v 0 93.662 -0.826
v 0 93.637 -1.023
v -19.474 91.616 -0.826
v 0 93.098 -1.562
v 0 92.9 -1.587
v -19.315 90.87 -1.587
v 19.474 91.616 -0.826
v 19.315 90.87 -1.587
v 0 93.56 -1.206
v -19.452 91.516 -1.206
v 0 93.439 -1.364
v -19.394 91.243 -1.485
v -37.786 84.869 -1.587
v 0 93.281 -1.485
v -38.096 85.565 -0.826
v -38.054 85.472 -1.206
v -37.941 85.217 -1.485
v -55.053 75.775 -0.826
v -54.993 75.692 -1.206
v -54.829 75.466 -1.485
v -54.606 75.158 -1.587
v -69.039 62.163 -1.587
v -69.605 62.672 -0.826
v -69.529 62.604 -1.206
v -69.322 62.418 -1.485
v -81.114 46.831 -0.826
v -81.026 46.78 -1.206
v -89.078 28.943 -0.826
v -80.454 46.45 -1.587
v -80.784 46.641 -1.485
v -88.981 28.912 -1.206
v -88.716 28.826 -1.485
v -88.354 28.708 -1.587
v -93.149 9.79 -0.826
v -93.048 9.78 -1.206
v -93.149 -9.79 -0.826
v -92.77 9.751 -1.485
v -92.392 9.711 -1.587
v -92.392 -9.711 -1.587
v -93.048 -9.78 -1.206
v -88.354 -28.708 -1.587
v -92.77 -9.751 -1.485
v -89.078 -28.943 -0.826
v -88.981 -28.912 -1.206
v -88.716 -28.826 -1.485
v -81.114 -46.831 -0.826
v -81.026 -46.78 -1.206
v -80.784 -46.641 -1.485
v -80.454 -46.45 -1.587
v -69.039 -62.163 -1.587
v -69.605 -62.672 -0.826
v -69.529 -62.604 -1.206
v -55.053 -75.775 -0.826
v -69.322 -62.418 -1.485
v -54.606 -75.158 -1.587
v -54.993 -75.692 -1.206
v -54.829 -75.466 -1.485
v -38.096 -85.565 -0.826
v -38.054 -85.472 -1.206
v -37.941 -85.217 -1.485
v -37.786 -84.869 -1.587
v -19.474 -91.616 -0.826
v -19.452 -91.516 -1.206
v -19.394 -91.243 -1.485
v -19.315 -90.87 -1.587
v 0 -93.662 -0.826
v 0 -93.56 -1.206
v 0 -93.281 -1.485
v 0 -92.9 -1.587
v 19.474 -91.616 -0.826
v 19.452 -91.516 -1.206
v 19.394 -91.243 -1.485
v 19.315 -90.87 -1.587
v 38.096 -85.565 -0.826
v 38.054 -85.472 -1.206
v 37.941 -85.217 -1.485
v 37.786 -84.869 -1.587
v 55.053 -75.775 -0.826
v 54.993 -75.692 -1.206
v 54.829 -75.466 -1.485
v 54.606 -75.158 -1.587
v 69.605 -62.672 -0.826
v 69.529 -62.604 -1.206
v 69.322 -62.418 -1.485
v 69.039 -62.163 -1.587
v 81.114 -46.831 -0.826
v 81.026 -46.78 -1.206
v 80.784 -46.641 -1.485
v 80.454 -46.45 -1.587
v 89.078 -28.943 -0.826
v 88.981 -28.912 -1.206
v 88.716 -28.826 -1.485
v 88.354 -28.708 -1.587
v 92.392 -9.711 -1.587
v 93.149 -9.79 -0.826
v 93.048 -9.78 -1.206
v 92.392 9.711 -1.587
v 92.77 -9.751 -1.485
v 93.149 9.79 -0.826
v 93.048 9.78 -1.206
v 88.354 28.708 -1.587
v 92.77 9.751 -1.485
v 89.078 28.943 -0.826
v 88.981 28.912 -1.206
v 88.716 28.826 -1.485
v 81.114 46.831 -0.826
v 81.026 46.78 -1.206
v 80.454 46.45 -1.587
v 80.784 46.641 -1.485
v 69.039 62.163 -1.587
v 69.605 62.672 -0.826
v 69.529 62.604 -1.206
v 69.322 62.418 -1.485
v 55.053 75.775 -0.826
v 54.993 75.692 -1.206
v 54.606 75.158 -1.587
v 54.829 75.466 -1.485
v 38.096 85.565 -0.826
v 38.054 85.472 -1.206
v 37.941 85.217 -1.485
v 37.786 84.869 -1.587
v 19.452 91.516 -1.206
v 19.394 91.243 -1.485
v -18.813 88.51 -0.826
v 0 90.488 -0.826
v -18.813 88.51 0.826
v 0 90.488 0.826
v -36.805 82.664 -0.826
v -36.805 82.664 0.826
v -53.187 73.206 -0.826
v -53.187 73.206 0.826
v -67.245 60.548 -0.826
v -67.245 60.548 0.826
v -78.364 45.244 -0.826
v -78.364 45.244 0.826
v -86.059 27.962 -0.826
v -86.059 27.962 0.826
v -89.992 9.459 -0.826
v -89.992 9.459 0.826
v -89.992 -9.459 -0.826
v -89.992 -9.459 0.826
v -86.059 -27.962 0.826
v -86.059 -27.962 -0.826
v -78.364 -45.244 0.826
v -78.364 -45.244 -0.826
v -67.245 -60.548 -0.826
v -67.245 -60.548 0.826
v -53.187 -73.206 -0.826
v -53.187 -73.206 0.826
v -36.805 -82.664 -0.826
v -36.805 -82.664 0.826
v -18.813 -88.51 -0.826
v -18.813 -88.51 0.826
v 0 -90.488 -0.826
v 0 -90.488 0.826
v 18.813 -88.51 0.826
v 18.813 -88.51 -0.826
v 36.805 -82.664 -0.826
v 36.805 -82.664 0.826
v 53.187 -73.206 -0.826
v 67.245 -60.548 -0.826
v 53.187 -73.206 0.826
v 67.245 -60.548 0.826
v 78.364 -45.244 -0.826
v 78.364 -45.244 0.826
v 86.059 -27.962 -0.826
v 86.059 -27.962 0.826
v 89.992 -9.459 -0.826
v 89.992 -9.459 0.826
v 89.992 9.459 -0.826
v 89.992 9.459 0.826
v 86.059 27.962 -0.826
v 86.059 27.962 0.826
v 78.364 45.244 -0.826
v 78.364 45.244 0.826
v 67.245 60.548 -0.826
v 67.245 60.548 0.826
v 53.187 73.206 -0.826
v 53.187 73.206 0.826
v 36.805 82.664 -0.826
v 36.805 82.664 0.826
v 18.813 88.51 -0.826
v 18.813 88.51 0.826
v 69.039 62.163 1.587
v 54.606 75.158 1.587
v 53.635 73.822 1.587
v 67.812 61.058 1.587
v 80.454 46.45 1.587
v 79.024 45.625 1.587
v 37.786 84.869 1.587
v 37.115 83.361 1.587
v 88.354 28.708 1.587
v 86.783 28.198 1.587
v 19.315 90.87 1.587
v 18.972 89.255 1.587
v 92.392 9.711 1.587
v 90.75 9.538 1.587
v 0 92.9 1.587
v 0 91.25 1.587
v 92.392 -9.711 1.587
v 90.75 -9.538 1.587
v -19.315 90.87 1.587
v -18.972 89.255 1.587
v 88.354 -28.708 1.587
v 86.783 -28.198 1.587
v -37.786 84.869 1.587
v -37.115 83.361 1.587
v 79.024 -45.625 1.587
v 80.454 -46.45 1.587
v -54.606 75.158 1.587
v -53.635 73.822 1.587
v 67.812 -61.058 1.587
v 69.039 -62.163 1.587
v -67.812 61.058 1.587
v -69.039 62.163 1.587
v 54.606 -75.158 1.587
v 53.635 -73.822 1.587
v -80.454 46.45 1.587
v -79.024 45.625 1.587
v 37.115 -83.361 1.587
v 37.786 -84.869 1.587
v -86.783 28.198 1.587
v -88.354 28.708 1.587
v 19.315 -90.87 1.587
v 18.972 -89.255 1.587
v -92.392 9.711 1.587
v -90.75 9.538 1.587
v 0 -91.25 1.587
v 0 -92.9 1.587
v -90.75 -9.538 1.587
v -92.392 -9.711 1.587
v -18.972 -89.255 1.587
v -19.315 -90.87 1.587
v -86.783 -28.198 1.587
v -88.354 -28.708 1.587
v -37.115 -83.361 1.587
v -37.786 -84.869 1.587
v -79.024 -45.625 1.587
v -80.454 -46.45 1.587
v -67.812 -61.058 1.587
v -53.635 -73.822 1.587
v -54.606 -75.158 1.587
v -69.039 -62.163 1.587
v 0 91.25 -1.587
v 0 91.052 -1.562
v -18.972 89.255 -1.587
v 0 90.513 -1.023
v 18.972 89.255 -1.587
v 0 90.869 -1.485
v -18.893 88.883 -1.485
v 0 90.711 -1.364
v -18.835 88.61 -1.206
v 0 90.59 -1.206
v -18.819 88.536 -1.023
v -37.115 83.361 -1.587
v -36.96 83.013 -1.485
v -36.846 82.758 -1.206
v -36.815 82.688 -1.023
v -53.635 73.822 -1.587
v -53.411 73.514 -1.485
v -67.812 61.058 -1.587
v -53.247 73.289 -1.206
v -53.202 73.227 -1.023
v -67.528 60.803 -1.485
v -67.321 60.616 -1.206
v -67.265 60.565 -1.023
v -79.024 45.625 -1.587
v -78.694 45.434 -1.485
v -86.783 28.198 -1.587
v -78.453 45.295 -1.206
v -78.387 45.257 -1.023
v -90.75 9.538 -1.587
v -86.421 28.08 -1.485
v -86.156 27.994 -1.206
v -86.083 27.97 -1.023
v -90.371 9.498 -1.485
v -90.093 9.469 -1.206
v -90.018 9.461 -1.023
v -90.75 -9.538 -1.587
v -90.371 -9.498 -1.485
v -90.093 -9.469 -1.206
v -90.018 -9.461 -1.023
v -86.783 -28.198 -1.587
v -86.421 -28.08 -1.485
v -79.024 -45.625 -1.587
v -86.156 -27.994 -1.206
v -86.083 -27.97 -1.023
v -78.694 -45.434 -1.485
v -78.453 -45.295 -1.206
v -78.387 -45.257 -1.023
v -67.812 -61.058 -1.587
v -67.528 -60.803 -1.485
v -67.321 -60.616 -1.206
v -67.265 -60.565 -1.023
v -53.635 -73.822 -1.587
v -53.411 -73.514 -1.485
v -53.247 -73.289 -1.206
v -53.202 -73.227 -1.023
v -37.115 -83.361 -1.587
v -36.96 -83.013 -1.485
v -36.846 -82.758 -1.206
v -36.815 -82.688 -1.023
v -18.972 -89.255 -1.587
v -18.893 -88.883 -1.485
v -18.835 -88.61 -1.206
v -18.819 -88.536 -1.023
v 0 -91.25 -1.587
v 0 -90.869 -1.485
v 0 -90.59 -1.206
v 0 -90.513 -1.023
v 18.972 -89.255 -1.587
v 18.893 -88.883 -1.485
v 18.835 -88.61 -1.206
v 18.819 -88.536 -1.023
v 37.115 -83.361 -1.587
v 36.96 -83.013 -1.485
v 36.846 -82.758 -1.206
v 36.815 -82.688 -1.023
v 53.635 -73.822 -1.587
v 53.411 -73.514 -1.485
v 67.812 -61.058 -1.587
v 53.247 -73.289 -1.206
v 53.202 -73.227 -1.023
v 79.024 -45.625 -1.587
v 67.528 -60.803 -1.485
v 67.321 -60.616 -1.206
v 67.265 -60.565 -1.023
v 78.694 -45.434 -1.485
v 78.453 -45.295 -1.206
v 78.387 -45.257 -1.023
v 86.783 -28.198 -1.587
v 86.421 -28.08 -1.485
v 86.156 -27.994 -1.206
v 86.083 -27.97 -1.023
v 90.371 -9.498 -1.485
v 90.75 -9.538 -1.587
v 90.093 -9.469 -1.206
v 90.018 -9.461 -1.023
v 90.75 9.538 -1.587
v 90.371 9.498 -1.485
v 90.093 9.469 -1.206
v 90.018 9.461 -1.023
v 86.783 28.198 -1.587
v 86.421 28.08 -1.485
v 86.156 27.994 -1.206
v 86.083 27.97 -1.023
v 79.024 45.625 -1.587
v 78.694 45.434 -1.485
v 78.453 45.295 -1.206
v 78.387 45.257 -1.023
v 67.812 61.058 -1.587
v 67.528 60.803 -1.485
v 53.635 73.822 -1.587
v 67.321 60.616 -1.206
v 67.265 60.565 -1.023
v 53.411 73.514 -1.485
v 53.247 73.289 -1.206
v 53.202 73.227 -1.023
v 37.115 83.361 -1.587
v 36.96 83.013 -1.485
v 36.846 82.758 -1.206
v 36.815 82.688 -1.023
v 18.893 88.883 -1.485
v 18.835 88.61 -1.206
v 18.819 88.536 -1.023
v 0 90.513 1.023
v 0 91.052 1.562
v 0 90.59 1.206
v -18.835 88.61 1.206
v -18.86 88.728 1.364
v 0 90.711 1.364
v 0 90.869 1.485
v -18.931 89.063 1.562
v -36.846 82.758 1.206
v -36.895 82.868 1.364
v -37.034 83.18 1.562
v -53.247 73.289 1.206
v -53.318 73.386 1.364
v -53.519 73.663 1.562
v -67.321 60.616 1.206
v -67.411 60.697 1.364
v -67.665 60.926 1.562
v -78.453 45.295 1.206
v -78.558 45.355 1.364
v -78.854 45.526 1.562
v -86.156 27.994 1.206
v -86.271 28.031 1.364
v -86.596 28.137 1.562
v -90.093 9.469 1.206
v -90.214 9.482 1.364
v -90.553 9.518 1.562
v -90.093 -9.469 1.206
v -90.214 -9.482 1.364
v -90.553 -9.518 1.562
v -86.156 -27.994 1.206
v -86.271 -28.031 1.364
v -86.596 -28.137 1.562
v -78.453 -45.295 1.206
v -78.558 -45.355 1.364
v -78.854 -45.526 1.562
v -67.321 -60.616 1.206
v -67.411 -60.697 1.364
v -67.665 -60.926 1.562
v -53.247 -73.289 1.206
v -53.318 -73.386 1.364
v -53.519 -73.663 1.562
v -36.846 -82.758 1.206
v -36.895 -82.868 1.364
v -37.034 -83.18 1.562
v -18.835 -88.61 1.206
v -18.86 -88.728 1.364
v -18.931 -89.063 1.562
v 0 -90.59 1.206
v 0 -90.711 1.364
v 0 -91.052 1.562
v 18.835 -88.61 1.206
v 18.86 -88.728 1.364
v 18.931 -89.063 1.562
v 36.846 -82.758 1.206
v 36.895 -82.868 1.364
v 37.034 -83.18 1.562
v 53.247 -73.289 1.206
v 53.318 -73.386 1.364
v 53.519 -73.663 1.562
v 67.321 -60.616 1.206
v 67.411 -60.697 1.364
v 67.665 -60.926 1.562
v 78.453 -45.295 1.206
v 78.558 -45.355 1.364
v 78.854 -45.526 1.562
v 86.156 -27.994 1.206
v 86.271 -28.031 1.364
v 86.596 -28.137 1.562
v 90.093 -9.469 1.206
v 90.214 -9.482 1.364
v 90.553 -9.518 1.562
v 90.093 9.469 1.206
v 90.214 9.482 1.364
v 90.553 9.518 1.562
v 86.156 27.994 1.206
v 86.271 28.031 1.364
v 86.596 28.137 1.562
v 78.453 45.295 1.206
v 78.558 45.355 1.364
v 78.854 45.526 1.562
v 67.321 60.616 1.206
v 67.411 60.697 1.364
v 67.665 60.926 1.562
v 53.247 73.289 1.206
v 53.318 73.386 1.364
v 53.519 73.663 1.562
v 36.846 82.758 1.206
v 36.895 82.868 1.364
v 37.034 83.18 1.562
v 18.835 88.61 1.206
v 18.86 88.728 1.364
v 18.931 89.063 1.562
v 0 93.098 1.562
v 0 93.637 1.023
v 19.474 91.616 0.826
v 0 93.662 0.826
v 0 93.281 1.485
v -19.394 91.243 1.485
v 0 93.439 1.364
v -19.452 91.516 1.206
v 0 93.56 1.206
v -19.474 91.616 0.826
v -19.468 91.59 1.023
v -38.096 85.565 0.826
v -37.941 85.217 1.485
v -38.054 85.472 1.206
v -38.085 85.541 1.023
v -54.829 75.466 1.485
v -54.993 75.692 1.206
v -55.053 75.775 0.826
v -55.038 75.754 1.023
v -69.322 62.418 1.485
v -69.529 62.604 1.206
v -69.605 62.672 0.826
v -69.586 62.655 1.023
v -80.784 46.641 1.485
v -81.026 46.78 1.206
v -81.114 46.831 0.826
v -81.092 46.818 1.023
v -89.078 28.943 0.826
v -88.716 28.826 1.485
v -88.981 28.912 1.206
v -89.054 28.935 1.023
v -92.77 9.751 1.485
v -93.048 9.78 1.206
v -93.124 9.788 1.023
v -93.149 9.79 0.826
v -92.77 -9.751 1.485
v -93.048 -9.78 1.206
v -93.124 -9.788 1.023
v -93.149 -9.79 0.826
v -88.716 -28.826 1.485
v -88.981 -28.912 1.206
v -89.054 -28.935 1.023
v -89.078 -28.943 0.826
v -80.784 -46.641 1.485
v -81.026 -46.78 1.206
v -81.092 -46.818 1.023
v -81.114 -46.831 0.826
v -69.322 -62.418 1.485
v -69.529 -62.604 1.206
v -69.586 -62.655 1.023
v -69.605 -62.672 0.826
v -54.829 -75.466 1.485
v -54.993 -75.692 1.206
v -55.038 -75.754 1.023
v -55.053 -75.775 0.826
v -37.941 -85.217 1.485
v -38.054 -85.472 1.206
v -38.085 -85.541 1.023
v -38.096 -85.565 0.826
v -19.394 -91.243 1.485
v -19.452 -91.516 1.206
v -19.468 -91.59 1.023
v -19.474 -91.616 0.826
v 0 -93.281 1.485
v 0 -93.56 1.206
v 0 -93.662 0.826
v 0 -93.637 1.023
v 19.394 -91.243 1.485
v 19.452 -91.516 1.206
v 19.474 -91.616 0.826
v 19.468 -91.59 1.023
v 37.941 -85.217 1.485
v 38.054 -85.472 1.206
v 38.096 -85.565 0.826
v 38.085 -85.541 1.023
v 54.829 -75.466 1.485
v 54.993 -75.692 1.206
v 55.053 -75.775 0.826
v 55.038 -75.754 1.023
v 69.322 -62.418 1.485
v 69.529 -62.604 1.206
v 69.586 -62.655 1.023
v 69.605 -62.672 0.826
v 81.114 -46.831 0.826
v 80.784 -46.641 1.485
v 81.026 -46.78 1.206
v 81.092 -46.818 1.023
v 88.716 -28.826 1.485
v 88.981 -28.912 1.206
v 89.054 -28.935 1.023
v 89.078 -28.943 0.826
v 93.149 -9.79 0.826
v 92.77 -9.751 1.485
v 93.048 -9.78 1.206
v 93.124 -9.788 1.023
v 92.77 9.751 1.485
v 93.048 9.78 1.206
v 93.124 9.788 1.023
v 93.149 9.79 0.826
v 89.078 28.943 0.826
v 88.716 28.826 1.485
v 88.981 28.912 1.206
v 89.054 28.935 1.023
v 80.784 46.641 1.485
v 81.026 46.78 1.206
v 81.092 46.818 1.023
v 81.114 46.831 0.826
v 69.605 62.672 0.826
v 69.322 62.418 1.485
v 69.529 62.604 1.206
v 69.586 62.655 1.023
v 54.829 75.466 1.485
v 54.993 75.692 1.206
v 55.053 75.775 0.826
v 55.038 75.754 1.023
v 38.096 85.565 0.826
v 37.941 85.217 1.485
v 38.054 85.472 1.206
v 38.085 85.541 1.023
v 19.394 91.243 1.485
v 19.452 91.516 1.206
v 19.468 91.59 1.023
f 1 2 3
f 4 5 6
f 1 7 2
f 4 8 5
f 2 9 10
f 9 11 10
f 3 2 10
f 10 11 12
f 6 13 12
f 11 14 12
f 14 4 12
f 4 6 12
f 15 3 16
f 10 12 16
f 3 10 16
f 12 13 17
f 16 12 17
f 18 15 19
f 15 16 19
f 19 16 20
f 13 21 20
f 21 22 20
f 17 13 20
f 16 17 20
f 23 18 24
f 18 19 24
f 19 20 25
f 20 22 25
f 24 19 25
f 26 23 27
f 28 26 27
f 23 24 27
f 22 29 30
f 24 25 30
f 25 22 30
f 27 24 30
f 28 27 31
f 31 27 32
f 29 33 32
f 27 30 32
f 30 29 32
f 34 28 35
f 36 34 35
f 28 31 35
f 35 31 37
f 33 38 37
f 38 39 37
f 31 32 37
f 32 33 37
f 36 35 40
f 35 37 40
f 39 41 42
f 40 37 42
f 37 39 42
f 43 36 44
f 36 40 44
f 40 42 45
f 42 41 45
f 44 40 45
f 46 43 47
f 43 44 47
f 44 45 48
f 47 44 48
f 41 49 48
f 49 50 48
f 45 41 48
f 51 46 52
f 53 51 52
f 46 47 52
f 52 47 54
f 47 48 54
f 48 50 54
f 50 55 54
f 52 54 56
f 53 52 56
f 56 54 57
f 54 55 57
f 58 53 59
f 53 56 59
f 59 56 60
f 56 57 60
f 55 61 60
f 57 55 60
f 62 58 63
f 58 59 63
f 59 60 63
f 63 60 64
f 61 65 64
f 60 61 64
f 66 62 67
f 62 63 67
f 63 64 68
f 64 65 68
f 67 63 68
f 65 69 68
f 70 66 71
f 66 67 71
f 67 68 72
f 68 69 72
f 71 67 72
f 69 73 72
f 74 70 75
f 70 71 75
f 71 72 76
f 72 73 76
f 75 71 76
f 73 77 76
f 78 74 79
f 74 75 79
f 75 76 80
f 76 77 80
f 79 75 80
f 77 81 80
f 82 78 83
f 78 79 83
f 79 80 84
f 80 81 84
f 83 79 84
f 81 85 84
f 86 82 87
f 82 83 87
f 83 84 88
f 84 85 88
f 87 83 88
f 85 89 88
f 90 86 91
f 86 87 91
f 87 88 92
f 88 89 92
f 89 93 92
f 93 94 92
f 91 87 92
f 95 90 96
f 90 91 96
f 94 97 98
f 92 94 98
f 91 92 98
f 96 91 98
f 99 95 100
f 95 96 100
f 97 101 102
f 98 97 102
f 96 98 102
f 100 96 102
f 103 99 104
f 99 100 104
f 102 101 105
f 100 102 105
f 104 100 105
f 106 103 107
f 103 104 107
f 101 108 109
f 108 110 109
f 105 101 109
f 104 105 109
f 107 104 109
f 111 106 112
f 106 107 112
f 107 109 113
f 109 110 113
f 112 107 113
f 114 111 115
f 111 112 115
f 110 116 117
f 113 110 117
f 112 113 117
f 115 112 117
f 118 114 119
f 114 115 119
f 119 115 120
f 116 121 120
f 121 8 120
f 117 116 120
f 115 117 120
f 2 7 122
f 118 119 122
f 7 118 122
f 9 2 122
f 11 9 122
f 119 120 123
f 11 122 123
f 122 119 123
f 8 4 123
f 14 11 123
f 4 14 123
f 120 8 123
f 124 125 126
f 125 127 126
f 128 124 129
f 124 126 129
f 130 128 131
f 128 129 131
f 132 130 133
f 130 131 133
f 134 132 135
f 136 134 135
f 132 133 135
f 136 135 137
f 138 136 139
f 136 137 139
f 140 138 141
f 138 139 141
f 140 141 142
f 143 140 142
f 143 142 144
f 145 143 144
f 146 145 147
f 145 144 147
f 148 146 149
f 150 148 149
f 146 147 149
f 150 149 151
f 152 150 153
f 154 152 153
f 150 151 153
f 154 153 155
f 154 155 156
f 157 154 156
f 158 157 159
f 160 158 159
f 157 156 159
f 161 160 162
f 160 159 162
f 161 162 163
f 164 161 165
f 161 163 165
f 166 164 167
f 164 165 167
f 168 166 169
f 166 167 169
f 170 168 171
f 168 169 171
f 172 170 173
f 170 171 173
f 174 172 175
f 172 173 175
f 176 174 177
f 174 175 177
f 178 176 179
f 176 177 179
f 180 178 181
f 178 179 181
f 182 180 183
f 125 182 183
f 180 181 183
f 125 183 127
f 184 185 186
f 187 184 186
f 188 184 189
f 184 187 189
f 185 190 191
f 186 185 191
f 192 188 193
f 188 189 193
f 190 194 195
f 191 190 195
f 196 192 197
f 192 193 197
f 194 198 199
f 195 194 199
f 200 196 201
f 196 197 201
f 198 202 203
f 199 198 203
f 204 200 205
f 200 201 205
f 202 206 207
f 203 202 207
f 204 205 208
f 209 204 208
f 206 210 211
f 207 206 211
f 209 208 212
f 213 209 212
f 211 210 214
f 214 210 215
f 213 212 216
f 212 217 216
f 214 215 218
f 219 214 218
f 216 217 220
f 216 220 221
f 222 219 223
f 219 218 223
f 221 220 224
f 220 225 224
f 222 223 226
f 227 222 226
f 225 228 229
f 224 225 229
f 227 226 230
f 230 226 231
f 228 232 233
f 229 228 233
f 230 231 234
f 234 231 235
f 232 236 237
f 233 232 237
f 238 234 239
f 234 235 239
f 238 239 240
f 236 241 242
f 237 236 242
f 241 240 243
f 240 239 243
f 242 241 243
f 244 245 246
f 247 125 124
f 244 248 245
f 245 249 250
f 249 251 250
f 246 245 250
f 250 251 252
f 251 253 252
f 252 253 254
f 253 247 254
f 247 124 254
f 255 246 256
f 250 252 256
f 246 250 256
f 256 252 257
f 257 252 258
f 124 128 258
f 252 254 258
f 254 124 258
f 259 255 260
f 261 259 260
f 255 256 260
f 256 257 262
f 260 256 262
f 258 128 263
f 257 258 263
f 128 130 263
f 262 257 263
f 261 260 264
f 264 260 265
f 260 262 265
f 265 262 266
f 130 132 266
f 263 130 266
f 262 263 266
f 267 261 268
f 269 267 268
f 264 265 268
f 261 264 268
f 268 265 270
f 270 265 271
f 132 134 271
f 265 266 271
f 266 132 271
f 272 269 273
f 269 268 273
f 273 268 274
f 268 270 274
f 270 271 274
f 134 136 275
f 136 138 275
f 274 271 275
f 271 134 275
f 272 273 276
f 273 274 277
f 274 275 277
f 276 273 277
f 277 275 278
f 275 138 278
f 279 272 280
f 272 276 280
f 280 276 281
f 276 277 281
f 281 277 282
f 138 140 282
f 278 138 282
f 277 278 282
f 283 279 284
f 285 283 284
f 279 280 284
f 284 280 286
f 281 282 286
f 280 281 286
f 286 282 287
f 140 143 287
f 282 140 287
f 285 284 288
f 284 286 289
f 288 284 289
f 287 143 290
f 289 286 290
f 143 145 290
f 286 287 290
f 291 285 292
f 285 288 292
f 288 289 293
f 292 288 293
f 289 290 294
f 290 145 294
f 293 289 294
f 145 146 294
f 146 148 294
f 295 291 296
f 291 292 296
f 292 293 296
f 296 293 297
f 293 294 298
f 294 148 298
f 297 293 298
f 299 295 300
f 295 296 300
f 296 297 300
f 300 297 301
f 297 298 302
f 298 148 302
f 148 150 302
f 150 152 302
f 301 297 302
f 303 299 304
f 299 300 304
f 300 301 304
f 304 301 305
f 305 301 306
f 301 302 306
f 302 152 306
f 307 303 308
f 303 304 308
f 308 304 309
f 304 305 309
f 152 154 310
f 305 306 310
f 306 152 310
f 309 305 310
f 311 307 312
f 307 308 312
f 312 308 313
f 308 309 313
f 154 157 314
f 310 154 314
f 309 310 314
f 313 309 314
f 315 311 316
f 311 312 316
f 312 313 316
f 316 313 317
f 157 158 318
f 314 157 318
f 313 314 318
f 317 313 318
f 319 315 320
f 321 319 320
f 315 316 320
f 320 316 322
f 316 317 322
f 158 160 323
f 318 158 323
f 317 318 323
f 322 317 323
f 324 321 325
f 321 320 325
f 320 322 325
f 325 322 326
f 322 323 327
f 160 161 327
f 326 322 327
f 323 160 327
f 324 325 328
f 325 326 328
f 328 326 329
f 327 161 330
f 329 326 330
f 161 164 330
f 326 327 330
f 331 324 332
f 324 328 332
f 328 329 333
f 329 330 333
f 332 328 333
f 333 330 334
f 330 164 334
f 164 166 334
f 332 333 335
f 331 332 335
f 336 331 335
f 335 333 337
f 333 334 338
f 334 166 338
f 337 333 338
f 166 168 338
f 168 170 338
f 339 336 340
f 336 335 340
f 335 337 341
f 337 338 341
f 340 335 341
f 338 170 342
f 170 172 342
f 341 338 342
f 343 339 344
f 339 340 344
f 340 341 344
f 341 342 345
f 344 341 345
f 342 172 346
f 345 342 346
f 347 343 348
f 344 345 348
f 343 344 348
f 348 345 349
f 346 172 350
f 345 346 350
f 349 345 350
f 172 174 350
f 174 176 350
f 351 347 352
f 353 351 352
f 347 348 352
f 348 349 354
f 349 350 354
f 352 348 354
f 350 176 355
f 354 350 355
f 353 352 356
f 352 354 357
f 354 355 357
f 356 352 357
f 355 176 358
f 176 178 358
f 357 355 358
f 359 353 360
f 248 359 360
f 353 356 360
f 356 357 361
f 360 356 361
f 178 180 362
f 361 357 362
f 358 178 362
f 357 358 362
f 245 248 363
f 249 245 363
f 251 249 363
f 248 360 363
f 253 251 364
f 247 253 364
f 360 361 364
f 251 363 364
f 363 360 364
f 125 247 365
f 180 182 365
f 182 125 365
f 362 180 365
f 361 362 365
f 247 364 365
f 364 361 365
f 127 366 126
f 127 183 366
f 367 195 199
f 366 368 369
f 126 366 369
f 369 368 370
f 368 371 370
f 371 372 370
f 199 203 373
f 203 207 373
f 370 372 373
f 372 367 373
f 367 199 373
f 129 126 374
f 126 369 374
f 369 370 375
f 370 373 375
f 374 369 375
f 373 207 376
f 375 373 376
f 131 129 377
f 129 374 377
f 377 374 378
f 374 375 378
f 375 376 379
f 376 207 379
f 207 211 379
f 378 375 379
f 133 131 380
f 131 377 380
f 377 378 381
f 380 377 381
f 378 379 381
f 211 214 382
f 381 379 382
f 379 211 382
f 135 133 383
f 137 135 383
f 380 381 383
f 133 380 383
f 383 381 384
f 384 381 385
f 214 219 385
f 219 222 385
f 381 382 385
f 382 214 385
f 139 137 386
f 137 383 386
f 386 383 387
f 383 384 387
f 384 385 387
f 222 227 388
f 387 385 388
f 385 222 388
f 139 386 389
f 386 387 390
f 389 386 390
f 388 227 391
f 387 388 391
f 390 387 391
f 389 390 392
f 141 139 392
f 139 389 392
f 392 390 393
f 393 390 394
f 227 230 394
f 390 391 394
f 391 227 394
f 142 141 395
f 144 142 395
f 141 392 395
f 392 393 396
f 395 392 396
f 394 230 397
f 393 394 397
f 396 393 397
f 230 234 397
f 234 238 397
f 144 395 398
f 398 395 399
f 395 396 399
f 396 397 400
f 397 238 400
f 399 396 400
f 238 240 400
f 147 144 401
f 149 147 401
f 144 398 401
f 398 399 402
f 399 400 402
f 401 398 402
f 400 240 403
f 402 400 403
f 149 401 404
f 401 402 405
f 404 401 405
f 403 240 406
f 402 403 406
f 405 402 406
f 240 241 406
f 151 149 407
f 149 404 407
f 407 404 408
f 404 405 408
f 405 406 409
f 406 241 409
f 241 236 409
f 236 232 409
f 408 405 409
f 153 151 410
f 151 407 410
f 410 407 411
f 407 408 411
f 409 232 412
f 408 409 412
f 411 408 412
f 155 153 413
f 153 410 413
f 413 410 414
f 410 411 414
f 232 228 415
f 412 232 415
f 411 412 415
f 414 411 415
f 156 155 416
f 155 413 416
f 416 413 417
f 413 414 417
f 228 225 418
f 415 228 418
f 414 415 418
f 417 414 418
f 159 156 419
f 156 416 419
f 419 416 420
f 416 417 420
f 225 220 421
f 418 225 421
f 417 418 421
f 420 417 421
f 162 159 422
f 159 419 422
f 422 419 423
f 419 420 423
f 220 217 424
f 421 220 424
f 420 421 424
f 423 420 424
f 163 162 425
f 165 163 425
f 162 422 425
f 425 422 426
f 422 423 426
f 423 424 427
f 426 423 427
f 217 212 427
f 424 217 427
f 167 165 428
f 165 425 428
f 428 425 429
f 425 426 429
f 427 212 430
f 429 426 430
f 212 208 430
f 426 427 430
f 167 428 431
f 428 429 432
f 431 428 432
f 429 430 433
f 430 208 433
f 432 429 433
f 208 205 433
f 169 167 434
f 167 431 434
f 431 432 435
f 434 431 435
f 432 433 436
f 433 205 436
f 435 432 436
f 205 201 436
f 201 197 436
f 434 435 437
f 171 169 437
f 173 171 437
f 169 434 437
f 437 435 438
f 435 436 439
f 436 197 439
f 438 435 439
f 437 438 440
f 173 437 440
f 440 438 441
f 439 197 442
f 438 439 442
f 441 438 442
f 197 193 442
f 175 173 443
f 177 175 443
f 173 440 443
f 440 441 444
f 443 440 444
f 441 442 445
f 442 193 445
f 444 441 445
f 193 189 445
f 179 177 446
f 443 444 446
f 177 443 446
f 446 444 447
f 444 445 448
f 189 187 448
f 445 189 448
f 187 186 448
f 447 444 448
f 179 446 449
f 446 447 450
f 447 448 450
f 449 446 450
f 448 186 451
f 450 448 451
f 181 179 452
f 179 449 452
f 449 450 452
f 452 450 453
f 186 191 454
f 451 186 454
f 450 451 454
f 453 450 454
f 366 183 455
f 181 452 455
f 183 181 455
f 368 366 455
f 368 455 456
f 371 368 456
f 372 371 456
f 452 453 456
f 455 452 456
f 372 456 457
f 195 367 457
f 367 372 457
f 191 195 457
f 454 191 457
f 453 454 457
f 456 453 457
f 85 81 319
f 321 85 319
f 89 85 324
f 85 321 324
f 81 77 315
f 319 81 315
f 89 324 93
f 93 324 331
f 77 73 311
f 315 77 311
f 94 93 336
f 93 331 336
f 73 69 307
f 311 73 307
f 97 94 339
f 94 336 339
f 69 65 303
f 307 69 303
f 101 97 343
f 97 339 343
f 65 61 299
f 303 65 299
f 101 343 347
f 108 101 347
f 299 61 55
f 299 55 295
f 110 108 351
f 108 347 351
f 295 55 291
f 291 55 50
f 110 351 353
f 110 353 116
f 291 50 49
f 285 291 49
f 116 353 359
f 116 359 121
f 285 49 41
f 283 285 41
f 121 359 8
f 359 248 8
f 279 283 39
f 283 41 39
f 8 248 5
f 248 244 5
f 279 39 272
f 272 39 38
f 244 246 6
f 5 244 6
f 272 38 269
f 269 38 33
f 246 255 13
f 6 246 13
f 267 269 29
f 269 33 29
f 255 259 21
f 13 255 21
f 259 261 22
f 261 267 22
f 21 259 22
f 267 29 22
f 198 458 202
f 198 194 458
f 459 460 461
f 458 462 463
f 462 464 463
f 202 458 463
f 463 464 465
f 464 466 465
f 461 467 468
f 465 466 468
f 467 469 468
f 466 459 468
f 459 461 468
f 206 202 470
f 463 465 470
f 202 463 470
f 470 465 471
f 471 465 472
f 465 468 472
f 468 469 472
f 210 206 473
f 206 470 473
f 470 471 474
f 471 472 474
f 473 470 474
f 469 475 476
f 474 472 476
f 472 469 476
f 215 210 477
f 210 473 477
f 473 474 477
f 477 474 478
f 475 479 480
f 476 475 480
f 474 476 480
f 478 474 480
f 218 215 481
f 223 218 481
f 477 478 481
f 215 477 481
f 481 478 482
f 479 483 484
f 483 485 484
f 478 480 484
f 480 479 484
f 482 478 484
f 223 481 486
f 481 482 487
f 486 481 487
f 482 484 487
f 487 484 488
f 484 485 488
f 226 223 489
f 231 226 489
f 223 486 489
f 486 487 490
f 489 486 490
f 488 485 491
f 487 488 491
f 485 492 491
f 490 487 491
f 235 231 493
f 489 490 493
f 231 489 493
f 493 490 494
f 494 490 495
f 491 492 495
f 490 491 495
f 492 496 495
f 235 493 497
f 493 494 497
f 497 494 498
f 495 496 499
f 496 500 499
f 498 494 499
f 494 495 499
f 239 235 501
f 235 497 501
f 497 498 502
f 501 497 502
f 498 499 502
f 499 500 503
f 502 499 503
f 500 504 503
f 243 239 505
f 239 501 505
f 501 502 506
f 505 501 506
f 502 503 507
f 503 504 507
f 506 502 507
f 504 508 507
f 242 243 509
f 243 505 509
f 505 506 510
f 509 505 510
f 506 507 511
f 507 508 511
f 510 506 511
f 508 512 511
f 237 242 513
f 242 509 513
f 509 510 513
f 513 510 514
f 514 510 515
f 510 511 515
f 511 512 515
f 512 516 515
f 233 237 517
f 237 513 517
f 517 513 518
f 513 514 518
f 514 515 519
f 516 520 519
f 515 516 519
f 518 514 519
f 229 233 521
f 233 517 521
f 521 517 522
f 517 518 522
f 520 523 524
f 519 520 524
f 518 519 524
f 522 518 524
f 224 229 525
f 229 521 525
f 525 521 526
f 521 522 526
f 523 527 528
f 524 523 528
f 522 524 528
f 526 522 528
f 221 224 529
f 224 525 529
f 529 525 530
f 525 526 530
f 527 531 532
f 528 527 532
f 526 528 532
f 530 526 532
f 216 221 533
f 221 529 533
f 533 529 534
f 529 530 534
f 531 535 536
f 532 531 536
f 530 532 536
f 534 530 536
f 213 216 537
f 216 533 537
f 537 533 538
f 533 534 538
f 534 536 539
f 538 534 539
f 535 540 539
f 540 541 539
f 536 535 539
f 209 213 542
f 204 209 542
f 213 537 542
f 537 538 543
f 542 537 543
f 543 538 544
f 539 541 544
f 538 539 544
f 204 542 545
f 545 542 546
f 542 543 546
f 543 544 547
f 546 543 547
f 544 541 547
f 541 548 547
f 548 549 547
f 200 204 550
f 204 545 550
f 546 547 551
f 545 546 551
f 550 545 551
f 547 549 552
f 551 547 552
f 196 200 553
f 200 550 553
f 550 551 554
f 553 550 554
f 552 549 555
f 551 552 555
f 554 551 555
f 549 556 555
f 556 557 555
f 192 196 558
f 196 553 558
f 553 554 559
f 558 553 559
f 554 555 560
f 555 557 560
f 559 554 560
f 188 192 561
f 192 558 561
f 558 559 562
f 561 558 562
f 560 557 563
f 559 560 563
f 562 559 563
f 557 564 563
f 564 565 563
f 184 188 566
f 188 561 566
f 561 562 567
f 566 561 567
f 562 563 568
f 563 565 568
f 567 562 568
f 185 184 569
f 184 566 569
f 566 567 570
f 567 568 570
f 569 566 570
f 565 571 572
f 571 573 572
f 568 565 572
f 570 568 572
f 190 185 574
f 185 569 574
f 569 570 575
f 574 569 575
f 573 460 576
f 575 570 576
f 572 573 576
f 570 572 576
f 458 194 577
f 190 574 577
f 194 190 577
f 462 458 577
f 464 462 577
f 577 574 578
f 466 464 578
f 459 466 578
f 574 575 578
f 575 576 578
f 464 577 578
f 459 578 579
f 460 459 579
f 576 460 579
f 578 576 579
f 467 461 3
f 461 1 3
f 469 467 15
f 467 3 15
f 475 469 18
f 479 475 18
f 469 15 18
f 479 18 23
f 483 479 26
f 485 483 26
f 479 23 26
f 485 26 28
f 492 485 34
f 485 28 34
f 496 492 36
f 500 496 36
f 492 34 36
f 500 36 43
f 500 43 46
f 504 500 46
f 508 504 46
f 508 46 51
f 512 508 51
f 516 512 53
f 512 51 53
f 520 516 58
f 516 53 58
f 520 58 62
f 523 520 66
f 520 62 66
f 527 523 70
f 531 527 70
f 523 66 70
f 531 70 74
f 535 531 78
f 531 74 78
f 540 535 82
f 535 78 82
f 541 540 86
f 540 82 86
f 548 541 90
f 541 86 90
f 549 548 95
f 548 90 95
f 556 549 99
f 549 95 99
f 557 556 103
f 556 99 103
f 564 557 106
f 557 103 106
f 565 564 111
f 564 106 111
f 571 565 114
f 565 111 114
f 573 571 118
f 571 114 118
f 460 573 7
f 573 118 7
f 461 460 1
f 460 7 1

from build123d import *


with BuildPart() as part:
    # Sketch1 → Revolve1 (revolve)
    with BuildSketch(Plane(origin=(0, 0, 0), x_dir=(0, 0, -1), z_dir=(1, 0, 0))):
        with BuildLine():
            Line((-0.8255, 93.6625), (0.8255, 93.6625))
            ThreePointArc((0.8255, 93.6625), (1.364315367, 93.439315367), (1.5875, 92.9005))
            Line((1.5875, 92.9005), (1.5875, 91.2495))
            ThreePointArc((1.5875, 91.2495), (1.364315367, 90.710684633), (0.8255, 90.4875))
            Line((0.8255, 90.4875), (-0.8255, 90.4875))
            ThreePointArc((-0.8255, 90.4875), (-1.364315367, 90.710684633), (-1.5875, 91.2495))
            Line((-1.5875, 91.2495), (-1.5875, 92.9005))
            ThreePointArc((-1.5875, 92.9005), (-1.364315367, 93.439315367), (-0.8255, 93.6625))
        make_face()
    revolve(axis=Axis((0, 0, 0), (0, 0, 1)))


solid = part.part
